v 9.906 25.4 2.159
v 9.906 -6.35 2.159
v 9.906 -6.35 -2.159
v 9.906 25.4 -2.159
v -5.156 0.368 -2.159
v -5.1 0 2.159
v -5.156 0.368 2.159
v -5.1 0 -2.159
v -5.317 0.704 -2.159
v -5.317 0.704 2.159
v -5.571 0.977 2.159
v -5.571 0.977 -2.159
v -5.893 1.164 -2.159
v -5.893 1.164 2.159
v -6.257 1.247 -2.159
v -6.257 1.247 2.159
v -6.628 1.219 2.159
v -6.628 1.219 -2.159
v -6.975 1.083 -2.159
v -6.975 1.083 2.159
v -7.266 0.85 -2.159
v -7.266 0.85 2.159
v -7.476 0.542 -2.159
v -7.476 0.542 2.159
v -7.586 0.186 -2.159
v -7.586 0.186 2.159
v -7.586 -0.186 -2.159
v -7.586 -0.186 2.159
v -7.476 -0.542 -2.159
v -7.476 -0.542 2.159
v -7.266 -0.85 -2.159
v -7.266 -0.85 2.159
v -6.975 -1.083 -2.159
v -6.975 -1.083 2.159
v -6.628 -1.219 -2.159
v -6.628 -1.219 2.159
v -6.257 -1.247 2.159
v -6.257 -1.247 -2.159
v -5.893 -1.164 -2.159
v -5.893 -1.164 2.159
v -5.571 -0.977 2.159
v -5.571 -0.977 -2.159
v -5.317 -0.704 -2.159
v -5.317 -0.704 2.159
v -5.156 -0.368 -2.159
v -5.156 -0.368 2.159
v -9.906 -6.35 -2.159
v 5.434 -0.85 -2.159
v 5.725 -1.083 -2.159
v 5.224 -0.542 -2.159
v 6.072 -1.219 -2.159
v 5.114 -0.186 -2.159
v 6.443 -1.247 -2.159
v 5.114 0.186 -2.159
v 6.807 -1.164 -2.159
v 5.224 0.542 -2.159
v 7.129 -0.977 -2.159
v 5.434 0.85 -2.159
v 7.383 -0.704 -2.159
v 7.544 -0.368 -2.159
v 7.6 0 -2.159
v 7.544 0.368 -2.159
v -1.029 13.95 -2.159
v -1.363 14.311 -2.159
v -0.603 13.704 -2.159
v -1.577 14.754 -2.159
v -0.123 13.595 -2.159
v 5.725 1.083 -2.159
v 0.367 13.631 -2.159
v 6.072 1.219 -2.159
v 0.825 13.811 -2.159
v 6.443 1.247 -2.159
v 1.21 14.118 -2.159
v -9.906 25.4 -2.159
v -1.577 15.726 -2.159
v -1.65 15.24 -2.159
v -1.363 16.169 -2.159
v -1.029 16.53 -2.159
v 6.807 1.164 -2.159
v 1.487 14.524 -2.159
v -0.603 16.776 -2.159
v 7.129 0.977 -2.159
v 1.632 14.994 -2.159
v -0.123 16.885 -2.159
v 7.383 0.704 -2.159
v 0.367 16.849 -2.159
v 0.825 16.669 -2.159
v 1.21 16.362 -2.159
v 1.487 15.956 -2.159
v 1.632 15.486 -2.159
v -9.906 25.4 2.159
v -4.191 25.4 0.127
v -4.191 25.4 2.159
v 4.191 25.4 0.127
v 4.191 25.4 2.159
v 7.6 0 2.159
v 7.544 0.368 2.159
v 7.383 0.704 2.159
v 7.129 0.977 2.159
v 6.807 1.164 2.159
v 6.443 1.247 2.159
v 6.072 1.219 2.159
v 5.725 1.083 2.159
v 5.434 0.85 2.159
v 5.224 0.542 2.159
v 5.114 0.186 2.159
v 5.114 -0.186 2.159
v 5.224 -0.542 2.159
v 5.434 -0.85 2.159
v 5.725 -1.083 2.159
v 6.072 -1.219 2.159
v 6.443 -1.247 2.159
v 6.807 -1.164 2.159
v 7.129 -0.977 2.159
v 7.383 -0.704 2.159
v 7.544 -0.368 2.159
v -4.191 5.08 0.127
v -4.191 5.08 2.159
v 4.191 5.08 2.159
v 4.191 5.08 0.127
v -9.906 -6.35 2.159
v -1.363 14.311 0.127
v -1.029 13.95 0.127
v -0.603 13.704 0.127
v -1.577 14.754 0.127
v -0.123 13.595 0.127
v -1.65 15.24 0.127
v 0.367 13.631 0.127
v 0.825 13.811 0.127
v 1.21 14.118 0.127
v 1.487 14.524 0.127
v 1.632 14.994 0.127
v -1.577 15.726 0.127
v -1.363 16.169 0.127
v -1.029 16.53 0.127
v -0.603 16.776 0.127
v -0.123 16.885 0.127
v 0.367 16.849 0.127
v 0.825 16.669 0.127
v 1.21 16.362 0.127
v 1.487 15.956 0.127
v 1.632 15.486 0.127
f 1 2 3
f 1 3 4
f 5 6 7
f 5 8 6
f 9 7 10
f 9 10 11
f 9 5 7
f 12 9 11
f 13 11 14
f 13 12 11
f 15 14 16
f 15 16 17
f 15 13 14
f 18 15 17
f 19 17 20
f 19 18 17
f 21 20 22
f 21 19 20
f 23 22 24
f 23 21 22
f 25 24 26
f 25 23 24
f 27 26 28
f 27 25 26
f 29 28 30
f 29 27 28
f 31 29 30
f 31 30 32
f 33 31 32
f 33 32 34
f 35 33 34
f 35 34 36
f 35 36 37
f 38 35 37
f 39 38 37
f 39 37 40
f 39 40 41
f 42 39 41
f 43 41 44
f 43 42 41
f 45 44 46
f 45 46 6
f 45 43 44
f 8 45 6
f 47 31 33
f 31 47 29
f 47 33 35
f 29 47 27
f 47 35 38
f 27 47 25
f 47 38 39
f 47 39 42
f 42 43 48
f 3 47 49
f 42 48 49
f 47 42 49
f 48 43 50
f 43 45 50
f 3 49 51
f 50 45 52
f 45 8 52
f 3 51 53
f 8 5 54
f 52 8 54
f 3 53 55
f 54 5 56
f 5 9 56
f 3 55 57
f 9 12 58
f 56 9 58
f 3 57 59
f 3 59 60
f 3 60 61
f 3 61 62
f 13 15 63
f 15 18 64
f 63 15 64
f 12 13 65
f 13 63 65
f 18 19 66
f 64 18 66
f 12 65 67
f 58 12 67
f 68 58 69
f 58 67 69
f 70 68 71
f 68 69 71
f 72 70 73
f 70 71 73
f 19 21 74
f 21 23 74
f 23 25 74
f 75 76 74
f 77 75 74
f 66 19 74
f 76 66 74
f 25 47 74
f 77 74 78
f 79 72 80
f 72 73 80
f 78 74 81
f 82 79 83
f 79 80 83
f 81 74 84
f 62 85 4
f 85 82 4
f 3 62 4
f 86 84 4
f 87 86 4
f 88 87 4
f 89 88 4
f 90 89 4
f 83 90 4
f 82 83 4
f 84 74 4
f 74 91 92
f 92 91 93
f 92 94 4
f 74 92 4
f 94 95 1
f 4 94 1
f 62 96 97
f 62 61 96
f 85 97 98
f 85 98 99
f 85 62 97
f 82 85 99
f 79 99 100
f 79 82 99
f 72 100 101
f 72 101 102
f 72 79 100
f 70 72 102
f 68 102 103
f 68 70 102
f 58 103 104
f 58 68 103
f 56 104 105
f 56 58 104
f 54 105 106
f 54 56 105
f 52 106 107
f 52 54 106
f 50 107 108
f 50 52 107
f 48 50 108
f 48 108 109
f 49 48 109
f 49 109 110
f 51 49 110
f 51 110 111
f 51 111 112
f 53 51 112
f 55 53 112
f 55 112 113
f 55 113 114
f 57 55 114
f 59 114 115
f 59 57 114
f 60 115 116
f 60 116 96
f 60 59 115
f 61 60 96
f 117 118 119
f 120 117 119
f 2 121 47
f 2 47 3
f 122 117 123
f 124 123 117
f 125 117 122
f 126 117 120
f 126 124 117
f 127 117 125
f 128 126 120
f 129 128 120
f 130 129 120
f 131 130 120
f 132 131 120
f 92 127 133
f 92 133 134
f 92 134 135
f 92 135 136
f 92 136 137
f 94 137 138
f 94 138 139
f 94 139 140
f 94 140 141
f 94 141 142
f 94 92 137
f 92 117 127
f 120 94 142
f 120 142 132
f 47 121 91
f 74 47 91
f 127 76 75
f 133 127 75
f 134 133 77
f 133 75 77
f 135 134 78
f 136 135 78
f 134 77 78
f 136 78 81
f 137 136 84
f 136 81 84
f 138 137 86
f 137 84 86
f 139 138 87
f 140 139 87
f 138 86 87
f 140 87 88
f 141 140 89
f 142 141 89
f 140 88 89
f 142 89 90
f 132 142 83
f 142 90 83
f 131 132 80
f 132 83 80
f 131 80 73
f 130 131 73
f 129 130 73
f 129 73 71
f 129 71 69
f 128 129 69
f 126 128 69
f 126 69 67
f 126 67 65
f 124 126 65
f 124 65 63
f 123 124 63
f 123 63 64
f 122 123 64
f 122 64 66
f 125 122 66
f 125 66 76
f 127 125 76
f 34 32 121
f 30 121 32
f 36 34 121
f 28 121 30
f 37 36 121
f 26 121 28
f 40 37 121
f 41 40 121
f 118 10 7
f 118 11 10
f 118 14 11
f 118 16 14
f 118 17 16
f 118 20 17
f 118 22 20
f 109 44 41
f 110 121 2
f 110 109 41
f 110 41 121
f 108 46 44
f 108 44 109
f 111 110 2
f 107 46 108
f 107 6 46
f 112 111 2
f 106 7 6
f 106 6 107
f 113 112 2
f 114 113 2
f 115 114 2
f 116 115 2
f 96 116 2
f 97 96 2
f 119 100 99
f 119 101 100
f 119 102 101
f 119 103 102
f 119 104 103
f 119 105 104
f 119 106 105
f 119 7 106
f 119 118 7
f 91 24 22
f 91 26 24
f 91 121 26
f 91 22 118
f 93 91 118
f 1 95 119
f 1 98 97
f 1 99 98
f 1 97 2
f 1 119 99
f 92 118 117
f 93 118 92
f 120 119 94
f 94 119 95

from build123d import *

# Parameters (mm, degrees)
F0_W     = 19.812
F0_H     = 31.75
F0_R     = 1.25
F1_DEPTH = 2.159
F3_D     = 3.3
F4_W     = 8.382
F4_H     = 20.32
F5_DEPTH = 2.032


with BuildPart() as f1:
    # F0 (on Top) → F1 (new body, symmetric)
    with BuildSketch(Plane.XY):
        with Locations((0, 9.525)):
            Rectangle(F0_W, F0_H)
        with Locations((-6.35, 0)):
            Circle(F0_R, mode=Mode.SUBTRACT)
        with Locations((6.35, 0)):
            Circle(F0_R, mode=Mode.SUBTRACT)
    extrude(amount=F1_DEPTH, both=True)

    # F3 (through all)
    with Locations(Plane.XY.offset(2.159)):
        with Locations((0, 15.24)):
            Hole(F3_D / 2)

    # F4 (on face) → F5 (cut)
    with BuildSketch(Plane.XY.offset(2.159)):
        with Locations((0, 15.24)):
            Rectangle(F4_W, F4_H)
    extrude(amount=-F5_DEPTH, mode=Mode.SUBTRACT)


solid = f1.part
